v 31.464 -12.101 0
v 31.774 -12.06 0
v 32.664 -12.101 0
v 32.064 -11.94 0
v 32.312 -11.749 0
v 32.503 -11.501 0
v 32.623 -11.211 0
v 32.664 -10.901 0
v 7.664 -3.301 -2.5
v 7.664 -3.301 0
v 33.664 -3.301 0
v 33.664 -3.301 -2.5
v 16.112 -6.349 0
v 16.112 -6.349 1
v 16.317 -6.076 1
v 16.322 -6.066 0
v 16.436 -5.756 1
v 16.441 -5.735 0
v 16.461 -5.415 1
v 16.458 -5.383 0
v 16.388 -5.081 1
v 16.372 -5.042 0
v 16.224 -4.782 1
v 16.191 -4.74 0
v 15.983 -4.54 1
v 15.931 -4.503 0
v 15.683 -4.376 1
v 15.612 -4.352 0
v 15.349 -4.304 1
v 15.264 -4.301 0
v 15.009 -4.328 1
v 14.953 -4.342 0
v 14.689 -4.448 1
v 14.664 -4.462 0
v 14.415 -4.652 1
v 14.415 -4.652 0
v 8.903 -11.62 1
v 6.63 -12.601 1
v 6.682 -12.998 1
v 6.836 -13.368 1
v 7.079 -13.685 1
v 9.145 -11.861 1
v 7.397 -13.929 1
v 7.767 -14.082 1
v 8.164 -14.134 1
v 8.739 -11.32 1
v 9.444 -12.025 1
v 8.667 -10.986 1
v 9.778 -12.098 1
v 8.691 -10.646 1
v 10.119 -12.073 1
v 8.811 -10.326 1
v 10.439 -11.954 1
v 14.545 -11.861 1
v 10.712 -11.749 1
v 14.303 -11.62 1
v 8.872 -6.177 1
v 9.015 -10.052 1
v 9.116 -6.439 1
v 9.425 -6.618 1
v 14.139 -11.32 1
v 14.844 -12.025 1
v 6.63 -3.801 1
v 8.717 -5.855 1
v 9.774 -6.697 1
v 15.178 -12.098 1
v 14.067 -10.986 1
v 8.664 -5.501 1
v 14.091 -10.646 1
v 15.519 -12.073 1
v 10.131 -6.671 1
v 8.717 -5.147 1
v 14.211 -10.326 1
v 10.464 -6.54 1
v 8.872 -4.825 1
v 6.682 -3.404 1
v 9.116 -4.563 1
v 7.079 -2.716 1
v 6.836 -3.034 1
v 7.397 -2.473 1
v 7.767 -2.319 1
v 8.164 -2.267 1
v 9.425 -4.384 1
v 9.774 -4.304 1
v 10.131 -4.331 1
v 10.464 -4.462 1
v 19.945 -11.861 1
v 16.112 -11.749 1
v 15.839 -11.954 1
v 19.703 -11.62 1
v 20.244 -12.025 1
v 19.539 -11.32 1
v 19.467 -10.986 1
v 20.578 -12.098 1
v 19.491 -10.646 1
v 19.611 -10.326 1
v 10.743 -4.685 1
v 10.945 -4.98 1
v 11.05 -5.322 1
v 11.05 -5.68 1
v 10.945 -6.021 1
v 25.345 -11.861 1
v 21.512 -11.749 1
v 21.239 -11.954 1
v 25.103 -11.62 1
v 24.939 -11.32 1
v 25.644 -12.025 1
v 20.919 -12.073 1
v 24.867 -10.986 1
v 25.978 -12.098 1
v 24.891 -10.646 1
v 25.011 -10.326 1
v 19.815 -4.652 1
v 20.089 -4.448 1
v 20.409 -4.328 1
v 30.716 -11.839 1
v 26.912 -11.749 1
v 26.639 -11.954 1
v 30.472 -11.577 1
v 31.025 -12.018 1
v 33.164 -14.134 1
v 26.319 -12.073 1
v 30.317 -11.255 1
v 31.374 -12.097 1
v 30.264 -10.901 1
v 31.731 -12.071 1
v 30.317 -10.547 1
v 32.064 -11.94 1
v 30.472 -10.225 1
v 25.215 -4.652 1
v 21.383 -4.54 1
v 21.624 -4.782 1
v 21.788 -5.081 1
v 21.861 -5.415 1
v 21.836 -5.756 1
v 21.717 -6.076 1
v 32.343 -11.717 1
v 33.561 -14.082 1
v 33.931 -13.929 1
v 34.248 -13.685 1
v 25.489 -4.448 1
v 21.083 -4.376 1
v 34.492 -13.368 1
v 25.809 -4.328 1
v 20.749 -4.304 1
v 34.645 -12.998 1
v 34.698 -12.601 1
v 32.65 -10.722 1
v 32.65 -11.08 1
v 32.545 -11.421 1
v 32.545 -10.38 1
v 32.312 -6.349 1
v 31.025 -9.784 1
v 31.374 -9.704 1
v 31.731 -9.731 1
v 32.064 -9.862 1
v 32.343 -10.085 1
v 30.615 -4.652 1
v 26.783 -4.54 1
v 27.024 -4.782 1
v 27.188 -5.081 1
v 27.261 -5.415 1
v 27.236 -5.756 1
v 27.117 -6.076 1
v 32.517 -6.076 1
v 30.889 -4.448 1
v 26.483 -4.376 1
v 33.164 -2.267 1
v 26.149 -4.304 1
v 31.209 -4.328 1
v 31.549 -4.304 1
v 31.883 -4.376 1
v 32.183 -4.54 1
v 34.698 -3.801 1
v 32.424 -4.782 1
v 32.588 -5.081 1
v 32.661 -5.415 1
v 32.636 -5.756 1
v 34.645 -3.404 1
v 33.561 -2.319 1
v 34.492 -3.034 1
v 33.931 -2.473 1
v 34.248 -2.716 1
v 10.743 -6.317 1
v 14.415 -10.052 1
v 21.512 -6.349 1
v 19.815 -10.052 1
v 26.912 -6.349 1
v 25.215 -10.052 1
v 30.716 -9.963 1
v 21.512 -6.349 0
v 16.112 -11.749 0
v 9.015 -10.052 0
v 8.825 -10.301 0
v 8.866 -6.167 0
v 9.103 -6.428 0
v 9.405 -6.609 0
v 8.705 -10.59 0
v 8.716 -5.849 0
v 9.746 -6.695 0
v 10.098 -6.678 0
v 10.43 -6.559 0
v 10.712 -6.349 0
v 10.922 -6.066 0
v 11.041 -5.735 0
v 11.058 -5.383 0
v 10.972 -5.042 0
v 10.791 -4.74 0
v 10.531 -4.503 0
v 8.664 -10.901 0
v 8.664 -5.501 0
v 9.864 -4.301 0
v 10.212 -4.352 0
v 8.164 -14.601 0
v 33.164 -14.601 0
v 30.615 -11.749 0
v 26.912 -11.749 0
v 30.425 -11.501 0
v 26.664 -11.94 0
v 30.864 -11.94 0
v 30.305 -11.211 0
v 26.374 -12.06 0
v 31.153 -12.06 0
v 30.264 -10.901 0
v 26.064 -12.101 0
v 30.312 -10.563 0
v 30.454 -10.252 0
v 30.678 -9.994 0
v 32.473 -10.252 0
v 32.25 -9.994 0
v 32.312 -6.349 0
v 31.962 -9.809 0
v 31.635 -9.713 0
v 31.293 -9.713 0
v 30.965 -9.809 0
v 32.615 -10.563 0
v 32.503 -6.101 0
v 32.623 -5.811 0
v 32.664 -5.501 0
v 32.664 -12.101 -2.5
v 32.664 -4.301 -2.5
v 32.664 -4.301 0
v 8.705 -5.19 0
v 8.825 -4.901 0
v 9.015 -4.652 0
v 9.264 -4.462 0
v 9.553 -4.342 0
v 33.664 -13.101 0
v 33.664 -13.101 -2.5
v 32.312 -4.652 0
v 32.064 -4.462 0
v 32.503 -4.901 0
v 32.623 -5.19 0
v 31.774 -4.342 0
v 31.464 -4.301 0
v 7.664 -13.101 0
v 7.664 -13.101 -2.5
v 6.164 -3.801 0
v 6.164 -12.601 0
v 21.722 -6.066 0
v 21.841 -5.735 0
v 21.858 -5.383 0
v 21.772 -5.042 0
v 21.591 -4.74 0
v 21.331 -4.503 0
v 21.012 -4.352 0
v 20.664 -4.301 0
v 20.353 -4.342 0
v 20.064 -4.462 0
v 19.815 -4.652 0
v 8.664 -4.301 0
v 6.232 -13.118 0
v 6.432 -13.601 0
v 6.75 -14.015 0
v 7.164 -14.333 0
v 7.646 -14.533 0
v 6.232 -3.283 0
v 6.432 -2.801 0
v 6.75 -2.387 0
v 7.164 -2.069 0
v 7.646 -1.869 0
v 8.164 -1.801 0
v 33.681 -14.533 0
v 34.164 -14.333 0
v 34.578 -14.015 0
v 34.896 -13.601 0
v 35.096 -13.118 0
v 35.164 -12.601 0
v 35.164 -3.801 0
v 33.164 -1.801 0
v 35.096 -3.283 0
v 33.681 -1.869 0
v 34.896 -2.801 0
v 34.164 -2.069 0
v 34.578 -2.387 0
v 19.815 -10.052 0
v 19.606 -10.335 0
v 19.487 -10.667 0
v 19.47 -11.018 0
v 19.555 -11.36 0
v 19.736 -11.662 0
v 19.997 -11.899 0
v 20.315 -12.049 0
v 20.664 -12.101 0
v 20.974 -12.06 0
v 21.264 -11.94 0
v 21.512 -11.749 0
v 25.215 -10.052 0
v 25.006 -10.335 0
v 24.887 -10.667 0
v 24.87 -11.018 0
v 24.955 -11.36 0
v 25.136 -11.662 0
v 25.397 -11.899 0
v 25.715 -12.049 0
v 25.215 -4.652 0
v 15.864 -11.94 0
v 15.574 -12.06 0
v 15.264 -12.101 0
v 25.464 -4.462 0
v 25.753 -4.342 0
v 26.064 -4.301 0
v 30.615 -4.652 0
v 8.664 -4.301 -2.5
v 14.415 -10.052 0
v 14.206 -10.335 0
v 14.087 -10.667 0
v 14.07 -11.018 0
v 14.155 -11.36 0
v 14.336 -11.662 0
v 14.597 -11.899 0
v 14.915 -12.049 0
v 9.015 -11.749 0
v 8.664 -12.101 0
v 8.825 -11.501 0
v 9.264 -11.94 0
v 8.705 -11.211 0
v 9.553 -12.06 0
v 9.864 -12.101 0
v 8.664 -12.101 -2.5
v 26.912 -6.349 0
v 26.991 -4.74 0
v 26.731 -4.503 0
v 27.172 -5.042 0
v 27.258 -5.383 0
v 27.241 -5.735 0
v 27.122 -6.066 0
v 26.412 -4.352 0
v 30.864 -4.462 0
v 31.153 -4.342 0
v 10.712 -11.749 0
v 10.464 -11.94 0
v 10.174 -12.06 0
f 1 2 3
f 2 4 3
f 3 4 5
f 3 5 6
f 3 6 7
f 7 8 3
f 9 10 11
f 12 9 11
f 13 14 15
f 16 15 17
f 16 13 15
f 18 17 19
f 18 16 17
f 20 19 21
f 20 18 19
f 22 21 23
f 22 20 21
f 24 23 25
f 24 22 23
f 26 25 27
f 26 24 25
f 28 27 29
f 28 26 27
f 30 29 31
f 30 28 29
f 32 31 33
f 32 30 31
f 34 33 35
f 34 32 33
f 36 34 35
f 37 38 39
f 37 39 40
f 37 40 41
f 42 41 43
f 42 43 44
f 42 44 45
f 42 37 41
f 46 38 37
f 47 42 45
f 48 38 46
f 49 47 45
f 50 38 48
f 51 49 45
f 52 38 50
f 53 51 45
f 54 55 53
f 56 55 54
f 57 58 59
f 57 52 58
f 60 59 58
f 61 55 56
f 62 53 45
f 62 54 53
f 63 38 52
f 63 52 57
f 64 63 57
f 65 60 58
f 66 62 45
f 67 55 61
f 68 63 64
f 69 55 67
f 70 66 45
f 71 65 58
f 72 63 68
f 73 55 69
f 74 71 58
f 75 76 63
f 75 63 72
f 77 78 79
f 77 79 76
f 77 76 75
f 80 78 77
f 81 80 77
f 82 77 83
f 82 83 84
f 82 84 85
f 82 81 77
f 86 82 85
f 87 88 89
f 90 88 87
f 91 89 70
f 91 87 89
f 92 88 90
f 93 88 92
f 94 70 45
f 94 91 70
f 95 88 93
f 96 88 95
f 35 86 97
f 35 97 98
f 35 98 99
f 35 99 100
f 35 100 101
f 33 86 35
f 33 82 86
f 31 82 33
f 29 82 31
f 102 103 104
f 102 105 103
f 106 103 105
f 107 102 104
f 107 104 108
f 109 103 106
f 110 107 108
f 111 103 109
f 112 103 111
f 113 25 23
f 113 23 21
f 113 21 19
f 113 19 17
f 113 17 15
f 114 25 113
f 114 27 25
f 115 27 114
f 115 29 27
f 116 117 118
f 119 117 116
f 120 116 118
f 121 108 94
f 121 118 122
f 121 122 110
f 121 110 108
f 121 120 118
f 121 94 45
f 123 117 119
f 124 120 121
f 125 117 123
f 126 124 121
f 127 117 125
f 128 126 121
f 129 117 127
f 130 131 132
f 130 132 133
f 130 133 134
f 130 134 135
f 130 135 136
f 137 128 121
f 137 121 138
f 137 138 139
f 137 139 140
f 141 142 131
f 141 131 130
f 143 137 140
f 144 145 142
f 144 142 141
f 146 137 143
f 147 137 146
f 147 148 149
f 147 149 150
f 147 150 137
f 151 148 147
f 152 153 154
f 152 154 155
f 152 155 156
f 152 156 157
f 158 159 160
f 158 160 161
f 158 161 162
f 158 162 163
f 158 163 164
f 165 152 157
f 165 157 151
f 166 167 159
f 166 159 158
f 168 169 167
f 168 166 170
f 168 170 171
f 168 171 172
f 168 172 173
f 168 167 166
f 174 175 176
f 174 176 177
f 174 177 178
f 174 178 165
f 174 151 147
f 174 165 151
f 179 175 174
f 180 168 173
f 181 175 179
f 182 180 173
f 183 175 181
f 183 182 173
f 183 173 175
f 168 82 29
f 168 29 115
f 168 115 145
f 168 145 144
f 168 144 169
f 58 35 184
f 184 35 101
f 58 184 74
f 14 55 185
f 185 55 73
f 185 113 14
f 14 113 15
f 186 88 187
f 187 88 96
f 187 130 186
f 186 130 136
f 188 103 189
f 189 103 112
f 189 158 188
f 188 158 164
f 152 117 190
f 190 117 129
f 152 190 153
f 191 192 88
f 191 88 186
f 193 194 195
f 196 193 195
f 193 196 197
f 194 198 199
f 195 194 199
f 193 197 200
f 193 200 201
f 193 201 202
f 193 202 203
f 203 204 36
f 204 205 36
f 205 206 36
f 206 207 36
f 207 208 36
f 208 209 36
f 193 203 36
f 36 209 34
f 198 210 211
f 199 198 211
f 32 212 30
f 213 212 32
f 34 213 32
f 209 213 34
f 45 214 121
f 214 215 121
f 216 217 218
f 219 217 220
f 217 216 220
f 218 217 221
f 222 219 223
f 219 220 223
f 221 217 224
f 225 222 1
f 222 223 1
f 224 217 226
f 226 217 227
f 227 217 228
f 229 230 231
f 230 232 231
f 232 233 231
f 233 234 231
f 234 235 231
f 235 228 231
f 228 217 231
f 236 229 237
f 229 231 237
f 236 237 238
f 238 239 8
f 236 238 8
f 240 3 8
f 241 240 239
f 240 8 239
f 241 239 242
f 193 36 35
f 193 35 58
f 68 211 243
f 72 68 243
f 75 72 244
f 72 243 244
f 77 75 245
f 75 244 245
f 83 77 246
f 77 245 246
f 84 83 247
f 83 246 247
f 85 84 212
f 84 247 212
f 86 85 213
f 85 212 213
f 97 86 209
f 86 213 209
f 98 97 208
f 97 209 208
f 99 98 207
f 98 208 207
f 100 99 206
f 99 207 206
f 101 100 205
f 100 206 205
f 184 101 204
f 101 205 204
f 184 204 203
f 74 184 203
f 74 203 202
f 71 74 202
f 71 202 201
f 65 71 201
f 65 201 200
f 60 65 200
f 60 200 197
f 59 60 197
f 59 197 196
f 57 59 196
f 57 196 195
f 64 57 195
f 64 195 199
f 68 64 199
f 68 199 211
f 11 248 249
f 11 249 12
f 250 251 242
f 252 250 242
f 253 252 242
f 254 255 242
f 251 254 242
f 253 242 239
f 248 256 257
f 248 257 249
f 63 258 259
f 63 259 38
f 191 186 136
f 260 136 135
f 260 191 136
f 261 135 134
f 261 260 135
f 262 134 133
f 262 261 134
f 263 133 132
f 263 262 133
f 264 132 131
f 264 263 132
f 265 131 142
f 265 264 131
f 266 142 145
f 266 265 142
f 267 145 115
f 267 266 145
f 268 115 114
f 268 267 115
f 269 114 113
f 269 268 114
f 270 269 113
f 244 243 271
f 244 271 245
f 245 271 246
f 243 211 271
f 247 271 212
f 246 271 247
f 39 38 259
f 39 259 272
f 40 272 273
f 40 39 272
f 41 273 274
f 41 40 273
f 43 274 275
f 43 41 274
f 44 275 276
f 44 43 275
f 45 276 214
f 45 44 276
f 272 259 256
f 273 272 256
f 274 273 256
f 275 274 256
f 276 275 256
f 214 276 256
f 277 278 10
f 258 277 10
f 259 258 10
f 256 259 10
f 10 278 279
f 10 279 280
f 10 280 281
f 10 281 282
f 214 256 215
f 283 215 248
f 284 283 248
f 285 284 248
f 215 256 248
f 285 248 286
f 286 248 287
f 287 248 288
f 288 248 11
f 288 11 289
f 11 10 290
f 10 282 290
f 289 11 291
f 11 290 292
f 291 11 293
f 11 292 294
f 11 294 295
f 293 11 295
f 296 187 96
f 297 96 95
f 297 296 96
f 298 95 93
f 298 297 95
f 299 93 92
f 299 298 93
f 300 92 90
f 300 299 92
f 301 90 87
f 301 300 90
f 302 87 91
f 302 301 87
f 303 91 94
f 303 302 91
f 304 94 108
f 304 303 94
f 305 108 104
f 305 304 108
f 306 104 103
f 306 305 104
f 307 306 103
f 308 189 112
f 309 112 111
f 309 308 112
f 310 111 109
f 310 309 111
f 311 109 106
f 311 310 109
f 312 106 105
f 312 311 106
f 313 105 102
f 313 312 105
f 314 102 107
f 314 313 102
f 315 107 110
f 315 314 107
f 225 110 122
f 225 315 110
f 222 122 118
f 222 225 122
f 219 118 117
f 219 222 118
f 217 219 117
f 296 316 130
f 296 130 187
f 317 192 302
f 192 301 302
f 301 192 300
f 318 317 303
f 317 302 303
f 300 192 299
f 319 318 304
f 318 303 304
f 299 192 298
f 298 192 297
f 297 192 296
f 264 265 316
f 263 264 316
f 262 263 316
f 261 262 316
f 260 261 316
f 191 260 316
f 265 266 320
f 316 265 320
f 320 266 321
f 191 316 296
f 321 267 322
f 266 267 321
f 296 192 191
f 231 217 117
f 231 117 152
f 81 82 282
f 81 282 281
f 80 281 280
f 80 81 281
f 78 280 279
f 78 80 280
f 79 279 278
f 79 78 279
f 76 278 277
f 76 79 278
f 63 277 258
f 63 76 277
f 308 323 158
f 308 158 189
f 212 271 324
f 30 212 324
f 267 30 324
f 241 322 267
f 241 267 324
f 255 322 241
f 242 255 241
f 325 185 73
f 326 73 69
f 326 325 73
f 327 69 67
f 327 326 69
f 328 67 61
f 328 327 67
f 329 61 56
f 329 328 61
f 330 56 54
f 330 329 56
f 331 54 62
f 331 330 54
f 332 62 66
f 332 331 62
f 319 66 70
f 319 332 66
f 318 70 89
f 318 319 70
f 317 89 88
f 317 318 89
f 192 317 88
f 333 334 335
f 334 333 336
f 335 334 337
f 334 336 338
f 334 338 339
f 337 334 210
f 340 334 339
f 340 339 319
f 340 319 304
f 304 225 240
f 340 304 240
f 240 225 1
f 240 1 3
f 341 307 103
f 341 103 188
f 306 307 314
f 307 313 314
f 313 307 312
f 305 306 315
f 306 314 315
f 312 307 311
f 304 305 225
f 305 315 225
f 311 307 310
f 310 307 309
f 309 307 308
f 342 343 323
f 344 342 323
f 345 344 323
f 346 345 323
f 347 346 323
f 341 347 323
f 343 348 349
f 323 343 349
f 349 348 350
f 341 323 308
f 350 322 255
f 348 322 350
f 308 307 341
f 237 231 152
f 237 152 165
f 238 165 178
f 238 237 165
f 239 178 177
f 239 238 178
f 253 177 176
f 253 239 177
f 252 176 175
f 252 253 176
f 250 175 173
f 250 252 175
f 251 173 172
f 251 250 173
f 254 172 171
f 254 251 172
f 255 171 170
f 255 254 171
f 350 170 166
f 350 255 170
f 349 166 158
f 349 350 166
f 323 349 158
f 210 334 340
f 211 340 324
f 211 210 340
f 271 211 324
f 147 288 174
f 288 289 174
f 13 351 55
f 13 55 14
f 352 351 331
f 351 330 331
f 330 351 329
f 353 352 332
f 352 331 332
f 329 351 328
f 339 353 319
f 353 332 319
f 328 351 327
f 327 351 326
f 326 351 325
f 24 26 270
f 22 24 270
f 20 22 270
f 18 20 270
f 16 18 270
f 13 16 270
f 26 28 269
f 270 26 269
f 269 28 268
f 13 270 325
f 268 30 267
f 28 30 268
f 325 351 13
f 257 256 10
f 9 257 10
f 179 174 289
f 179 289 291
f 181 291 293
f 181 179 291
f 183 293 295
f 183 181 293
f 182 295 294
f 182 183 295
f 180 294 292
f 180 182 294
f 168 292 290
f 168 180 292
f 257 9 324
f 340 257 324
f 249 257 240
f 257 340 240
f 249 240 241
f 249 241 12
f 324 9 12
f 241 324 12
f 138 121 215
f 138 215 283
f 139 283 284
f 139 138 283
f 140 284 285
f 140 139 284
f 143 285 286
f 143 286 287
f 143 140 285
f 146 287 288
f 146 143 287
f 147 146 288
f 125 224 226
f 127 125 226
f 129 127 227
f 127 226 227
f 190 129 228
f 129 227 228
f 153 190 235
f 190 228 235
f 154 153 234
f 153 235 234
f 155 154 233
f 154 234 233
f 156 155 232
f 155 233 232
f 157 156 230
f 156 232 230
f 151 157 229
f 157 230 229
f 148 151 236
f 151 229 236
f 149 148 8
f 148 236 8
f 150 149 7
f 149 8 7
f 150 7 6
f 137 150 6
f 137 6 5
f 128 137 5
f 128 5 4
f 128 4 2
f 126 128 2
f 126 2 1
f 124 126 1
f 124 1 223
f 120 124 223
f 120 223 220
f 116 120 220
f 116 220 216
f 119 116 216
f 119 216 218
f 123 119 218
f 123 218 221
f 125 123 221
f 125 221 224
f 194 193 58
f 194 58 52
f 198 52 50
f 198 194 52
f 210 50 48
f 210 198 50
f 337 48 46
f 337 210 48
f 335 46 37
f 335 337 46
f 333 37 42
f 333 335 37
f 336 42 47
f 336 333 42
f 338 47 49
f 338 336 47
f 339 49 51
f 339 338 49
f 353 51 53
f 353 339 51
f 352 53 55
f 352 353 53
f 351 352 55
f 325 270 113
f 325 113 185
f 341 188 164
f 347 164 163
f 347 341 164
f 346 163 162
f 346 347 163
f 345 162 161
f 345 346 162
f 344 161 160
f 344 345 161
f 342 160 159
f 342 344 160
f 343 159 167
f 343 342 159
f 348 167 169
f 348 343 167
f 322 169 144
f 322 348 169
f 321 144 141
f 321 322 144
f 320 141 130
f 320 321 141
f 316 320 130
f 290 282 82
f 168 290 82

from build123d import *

# Parameters (mm, degrees)
SKETCH_1_W          = 26
SKETCH_1_H          = 9.8
SKETCH_1_W_2        = 24
SKETCH_1_H_2        = 7.8
EXTRUDE_1_DEPTH     = 2.5
EXTRUDE_2_DEPTH     = 1
EXTRUDE_2_TAPER     = 25
CUT_EXTRUDE_1_REACH = 3
SKETCH_3_R          = 1.2


with BuildPart() as part:
    # 草图1 → 凸台-拉伸1 (new body)
    with BuildSketch(Plane.XY):
        with Locations((20.66383505, -8.200793938)):
            Rectangle(SKETCH_1_W, SKETCH_1_H)
        with Locations((20.66383505, -8.200793938)):
            Rectangle(SKETCH_1_W_2, SKETCH_1_H_2, mode=Mode.SUBTRACT)
    extrude(amount=-EXTRUDE_1_DEPTH)

    # 草图2 → 凸台-拉伸2 (add)
    with BuildSketch(Plane.XY):
        with BuildLine():
            Line((35.16383505, -12.600793938), (35.16383505, -3.800793938))
            ThreePointArc((35.16383505, -3.800793938), (34.578048612, -2.386580376), (33.16383505, -1.800793938))
            Line((33.16383505, -1.800793938), (8.16383505, -1.800793938))
            ThreePointArc((8.16383505, -1.800793938), (6.749621488, -2.386580376), (6.16383505, -3.800793938))
            Line((6.16383505, -3.800793938), (6.16383505, -12.600793938))
            ThreePointArc((6.16383505, -12.600793938), (6.749621488, -14.015007501), (8.16383505, -14.600793938))
            Line((8.16383505, -14.600793938), (33.16383505, -14.600793938))
            ThreePointArc((33.16383505, -14.600793938), (34.578048612, -14.015007501), (35.16383505, -12.600793938))
        make_face()
    extrude(amount=EXTRUDE_2_DEPTH, taper=EXTRUDE_2_TAPER)

    # 草图3 → 切除-拉伸1 (cut, up to next)
    with BuildSketch(Plane(origin=(0, 0, 0), x_dir=(-1, 0, 0), z_dir=(0, 0, -1)), mode=Mode.PRIVATE) as cut_extrude_1_sk1:
        with Locations((-31.46383505, -10.900793938)):
            Circle(SKETCH_3_R)
    cut_extrude_1_tool1 = extrude(cut_extrude_1_sk1.sketch, amount=-CUT_EXTRUDE_1_REACH, mode=Mode.PRIVATE) & part.part
    add(cut_extrude_1_tool1.solids().sort_by_distance((31.463835, -10.900794, 0))[0], mode=Mode.SUBTRACT)
    # 草图3 → 切除-拉伸1 (cut, up to next)
    with BuildSketch(Plane(origin=(0, 0, 0), x_dir=(-1, 0, 0), z_dir=(0, 0, -1)), mode=Mode.PRIVATE) as cut_extrude_1_sk2:
        with Locations((-9.86383505, -5.500793938)):
            Circle(SKETCH_3_R)
    cut_extrude_1_tool2 = extrude(cut_extrude_1_sk2.sketch, amount=-CUT_EXTRUDE_1_REACH, mode=Mode.PRIVATE) & part.part
    add(cut_extrude_1_tool2.solids().sort_by_distance((9.863835, -5.500794, 0))[0], mode=Mode.SUBTRACT)
    # 草图3 → 切除-拉伸1 (cut, up to next)
    with BuildSketch(Plane(origin=(0, 0, 0), x_dir=(-1, 0, 0), z_dir=(0, 0, -1)), mode=Mode.PRIVATE) as cut_extrude_1_sk3:
        with BuildLine():
            Line((-30.615306913, -4.652265801), (-25.215306913, -10.052265801))
            ThreePointArc((-25.215306913, -10.052265801), (-25.215306913, -11.749322076), (-26.912363188, -11.749322076))
            Line((-26.912363188, -11.749322076), (-32.312363188, -6.349322076))
            ThreePointArc((-32.312363188, -6.349322076), (-32.312363188, -4.652265801), (-30.615306913, -4.652265801))
        make_face()
    cut_extrude_1_tool3 = extrude(cut_extrude_1_sk3.sketch, amount=-CUT_EXTRUDE_1_REACH, mode=Mode.PRIVATE) & part.part
    add(cut_extrude_1_tool3.solids().sort_by_distance((28.763835, -8.200794, 0))[0], mode=Mode.SUBTRACT)
    # 草图3 → 切除-拉伸1 (cut, up to next)
    with BuildSketch(Plane(origin=(0, 0, 0), x_dir=(-1, 0, 0), z_dir=(0, 0, -1)), mode=Mode.PRIVATE) as cut_extrude_1_sk4:
        with BuildLine():
            Line((-25.215306913, -4.652265801), (-19.815306913, -10.052265801))
            ThreePointArc((-19.815306913, -10.052265801), (-19.815306913, -11.749322076), (-21.512363188, -11.749322076))
            Line((-21.512363188, -11.749322076), (-26.912363188, -6.349322076))
            ThreePointArc((-26.912363188, -6.349322076), (-26.912363188, -4.652265801), (-25.215306913, -4.652265801))
        make_face()
    cut_extrude_1_tool4 = extrude(cut_extrude_1_sk4.sketch, amount=-CUT_EXTRUDE_1_REACH, mode=Mode.PRIVATE) & part.part
    add(cut_extrude_1_tool4.solids().sort_by_distance((23.363835, -8.200794, 0))[0], mode=Mode.SUBTRACT)
    # 草图3 → 切除-拉伸1 (cut, up to next)
    with BuildSketch(Plane(origin=(0, 0, 0), x_dir=(-1, 0, 0), z_dir=(0, 0, -1)), mode=Mode.PRIVATE) as cut_extrude_1_sk5:
        with BuildLine():
            Line((-19.815306913, -4.652265801), (-14.415306913, -10.052265801))
            ThreePointArc((-14.415306913, -10.052265801), (-14.415306913, -11.749322076), (-16.112363188, -11.749322076))
            Line((-16.112363188, -11.749322076), (-21.512363188, -6.349322076))
            ThreePointArc((-21.512363188, -6.349322076), (-21.512363188, -4.652265801), (-19.815306913, -4.652265801))
        make_face()
    cut_extrude_1_tool5 = extrude(cut_extrude_1_sk5.sketch, amount=-CUT_EXTRUDE_1_REACH, mode=Mode.PRIVATE) & part.part
    add(cut_extrude_1_tool5.solids().sort_by_distance((17.963835, -8.200794, 0))[0], mode=Mode.SUBTRACT)
    # 草图3 → 切除-拉伸1 (cut, up to next)
    with BuildSketch(Plane(origin=(0, 0, 0), x_dir=(-1, 0, 0), z_dir=(0, 0, -1)), mode=Mode.PRIVATE) as cut_extrude_1_sk6:
        with BuildLine():
            Line((-14.415306913, -4.652265801), (-9.015306913, -10.052265801))
            ThreePointArc((-9.015306913, -10.052265801), (-9.015306913, -11.749322076), (-10.712363188, -11.749322076))
            Line((-10.712363188, -11.749322076), (-16.112363188, -6.349322076))
            ThreePointArc((-16.112363188, -6.349322076), (-16.112363188, -4.652265801), (-14.415306913, -4.652265801))
        make_face()
    cut_extrude_1_tool6 = extrude(cut_extrude_1_sk6.sketch, amount=-CUT_EXTRUDE_1_REACH, mode=Mode.PRIVATE) & part.part
    add(cut_extrude_1_tool6.solids().sort_by_distance((12.563835, -8.200794, 0))[0], mode=Mode.SUBTRACT)


solid = part.part
